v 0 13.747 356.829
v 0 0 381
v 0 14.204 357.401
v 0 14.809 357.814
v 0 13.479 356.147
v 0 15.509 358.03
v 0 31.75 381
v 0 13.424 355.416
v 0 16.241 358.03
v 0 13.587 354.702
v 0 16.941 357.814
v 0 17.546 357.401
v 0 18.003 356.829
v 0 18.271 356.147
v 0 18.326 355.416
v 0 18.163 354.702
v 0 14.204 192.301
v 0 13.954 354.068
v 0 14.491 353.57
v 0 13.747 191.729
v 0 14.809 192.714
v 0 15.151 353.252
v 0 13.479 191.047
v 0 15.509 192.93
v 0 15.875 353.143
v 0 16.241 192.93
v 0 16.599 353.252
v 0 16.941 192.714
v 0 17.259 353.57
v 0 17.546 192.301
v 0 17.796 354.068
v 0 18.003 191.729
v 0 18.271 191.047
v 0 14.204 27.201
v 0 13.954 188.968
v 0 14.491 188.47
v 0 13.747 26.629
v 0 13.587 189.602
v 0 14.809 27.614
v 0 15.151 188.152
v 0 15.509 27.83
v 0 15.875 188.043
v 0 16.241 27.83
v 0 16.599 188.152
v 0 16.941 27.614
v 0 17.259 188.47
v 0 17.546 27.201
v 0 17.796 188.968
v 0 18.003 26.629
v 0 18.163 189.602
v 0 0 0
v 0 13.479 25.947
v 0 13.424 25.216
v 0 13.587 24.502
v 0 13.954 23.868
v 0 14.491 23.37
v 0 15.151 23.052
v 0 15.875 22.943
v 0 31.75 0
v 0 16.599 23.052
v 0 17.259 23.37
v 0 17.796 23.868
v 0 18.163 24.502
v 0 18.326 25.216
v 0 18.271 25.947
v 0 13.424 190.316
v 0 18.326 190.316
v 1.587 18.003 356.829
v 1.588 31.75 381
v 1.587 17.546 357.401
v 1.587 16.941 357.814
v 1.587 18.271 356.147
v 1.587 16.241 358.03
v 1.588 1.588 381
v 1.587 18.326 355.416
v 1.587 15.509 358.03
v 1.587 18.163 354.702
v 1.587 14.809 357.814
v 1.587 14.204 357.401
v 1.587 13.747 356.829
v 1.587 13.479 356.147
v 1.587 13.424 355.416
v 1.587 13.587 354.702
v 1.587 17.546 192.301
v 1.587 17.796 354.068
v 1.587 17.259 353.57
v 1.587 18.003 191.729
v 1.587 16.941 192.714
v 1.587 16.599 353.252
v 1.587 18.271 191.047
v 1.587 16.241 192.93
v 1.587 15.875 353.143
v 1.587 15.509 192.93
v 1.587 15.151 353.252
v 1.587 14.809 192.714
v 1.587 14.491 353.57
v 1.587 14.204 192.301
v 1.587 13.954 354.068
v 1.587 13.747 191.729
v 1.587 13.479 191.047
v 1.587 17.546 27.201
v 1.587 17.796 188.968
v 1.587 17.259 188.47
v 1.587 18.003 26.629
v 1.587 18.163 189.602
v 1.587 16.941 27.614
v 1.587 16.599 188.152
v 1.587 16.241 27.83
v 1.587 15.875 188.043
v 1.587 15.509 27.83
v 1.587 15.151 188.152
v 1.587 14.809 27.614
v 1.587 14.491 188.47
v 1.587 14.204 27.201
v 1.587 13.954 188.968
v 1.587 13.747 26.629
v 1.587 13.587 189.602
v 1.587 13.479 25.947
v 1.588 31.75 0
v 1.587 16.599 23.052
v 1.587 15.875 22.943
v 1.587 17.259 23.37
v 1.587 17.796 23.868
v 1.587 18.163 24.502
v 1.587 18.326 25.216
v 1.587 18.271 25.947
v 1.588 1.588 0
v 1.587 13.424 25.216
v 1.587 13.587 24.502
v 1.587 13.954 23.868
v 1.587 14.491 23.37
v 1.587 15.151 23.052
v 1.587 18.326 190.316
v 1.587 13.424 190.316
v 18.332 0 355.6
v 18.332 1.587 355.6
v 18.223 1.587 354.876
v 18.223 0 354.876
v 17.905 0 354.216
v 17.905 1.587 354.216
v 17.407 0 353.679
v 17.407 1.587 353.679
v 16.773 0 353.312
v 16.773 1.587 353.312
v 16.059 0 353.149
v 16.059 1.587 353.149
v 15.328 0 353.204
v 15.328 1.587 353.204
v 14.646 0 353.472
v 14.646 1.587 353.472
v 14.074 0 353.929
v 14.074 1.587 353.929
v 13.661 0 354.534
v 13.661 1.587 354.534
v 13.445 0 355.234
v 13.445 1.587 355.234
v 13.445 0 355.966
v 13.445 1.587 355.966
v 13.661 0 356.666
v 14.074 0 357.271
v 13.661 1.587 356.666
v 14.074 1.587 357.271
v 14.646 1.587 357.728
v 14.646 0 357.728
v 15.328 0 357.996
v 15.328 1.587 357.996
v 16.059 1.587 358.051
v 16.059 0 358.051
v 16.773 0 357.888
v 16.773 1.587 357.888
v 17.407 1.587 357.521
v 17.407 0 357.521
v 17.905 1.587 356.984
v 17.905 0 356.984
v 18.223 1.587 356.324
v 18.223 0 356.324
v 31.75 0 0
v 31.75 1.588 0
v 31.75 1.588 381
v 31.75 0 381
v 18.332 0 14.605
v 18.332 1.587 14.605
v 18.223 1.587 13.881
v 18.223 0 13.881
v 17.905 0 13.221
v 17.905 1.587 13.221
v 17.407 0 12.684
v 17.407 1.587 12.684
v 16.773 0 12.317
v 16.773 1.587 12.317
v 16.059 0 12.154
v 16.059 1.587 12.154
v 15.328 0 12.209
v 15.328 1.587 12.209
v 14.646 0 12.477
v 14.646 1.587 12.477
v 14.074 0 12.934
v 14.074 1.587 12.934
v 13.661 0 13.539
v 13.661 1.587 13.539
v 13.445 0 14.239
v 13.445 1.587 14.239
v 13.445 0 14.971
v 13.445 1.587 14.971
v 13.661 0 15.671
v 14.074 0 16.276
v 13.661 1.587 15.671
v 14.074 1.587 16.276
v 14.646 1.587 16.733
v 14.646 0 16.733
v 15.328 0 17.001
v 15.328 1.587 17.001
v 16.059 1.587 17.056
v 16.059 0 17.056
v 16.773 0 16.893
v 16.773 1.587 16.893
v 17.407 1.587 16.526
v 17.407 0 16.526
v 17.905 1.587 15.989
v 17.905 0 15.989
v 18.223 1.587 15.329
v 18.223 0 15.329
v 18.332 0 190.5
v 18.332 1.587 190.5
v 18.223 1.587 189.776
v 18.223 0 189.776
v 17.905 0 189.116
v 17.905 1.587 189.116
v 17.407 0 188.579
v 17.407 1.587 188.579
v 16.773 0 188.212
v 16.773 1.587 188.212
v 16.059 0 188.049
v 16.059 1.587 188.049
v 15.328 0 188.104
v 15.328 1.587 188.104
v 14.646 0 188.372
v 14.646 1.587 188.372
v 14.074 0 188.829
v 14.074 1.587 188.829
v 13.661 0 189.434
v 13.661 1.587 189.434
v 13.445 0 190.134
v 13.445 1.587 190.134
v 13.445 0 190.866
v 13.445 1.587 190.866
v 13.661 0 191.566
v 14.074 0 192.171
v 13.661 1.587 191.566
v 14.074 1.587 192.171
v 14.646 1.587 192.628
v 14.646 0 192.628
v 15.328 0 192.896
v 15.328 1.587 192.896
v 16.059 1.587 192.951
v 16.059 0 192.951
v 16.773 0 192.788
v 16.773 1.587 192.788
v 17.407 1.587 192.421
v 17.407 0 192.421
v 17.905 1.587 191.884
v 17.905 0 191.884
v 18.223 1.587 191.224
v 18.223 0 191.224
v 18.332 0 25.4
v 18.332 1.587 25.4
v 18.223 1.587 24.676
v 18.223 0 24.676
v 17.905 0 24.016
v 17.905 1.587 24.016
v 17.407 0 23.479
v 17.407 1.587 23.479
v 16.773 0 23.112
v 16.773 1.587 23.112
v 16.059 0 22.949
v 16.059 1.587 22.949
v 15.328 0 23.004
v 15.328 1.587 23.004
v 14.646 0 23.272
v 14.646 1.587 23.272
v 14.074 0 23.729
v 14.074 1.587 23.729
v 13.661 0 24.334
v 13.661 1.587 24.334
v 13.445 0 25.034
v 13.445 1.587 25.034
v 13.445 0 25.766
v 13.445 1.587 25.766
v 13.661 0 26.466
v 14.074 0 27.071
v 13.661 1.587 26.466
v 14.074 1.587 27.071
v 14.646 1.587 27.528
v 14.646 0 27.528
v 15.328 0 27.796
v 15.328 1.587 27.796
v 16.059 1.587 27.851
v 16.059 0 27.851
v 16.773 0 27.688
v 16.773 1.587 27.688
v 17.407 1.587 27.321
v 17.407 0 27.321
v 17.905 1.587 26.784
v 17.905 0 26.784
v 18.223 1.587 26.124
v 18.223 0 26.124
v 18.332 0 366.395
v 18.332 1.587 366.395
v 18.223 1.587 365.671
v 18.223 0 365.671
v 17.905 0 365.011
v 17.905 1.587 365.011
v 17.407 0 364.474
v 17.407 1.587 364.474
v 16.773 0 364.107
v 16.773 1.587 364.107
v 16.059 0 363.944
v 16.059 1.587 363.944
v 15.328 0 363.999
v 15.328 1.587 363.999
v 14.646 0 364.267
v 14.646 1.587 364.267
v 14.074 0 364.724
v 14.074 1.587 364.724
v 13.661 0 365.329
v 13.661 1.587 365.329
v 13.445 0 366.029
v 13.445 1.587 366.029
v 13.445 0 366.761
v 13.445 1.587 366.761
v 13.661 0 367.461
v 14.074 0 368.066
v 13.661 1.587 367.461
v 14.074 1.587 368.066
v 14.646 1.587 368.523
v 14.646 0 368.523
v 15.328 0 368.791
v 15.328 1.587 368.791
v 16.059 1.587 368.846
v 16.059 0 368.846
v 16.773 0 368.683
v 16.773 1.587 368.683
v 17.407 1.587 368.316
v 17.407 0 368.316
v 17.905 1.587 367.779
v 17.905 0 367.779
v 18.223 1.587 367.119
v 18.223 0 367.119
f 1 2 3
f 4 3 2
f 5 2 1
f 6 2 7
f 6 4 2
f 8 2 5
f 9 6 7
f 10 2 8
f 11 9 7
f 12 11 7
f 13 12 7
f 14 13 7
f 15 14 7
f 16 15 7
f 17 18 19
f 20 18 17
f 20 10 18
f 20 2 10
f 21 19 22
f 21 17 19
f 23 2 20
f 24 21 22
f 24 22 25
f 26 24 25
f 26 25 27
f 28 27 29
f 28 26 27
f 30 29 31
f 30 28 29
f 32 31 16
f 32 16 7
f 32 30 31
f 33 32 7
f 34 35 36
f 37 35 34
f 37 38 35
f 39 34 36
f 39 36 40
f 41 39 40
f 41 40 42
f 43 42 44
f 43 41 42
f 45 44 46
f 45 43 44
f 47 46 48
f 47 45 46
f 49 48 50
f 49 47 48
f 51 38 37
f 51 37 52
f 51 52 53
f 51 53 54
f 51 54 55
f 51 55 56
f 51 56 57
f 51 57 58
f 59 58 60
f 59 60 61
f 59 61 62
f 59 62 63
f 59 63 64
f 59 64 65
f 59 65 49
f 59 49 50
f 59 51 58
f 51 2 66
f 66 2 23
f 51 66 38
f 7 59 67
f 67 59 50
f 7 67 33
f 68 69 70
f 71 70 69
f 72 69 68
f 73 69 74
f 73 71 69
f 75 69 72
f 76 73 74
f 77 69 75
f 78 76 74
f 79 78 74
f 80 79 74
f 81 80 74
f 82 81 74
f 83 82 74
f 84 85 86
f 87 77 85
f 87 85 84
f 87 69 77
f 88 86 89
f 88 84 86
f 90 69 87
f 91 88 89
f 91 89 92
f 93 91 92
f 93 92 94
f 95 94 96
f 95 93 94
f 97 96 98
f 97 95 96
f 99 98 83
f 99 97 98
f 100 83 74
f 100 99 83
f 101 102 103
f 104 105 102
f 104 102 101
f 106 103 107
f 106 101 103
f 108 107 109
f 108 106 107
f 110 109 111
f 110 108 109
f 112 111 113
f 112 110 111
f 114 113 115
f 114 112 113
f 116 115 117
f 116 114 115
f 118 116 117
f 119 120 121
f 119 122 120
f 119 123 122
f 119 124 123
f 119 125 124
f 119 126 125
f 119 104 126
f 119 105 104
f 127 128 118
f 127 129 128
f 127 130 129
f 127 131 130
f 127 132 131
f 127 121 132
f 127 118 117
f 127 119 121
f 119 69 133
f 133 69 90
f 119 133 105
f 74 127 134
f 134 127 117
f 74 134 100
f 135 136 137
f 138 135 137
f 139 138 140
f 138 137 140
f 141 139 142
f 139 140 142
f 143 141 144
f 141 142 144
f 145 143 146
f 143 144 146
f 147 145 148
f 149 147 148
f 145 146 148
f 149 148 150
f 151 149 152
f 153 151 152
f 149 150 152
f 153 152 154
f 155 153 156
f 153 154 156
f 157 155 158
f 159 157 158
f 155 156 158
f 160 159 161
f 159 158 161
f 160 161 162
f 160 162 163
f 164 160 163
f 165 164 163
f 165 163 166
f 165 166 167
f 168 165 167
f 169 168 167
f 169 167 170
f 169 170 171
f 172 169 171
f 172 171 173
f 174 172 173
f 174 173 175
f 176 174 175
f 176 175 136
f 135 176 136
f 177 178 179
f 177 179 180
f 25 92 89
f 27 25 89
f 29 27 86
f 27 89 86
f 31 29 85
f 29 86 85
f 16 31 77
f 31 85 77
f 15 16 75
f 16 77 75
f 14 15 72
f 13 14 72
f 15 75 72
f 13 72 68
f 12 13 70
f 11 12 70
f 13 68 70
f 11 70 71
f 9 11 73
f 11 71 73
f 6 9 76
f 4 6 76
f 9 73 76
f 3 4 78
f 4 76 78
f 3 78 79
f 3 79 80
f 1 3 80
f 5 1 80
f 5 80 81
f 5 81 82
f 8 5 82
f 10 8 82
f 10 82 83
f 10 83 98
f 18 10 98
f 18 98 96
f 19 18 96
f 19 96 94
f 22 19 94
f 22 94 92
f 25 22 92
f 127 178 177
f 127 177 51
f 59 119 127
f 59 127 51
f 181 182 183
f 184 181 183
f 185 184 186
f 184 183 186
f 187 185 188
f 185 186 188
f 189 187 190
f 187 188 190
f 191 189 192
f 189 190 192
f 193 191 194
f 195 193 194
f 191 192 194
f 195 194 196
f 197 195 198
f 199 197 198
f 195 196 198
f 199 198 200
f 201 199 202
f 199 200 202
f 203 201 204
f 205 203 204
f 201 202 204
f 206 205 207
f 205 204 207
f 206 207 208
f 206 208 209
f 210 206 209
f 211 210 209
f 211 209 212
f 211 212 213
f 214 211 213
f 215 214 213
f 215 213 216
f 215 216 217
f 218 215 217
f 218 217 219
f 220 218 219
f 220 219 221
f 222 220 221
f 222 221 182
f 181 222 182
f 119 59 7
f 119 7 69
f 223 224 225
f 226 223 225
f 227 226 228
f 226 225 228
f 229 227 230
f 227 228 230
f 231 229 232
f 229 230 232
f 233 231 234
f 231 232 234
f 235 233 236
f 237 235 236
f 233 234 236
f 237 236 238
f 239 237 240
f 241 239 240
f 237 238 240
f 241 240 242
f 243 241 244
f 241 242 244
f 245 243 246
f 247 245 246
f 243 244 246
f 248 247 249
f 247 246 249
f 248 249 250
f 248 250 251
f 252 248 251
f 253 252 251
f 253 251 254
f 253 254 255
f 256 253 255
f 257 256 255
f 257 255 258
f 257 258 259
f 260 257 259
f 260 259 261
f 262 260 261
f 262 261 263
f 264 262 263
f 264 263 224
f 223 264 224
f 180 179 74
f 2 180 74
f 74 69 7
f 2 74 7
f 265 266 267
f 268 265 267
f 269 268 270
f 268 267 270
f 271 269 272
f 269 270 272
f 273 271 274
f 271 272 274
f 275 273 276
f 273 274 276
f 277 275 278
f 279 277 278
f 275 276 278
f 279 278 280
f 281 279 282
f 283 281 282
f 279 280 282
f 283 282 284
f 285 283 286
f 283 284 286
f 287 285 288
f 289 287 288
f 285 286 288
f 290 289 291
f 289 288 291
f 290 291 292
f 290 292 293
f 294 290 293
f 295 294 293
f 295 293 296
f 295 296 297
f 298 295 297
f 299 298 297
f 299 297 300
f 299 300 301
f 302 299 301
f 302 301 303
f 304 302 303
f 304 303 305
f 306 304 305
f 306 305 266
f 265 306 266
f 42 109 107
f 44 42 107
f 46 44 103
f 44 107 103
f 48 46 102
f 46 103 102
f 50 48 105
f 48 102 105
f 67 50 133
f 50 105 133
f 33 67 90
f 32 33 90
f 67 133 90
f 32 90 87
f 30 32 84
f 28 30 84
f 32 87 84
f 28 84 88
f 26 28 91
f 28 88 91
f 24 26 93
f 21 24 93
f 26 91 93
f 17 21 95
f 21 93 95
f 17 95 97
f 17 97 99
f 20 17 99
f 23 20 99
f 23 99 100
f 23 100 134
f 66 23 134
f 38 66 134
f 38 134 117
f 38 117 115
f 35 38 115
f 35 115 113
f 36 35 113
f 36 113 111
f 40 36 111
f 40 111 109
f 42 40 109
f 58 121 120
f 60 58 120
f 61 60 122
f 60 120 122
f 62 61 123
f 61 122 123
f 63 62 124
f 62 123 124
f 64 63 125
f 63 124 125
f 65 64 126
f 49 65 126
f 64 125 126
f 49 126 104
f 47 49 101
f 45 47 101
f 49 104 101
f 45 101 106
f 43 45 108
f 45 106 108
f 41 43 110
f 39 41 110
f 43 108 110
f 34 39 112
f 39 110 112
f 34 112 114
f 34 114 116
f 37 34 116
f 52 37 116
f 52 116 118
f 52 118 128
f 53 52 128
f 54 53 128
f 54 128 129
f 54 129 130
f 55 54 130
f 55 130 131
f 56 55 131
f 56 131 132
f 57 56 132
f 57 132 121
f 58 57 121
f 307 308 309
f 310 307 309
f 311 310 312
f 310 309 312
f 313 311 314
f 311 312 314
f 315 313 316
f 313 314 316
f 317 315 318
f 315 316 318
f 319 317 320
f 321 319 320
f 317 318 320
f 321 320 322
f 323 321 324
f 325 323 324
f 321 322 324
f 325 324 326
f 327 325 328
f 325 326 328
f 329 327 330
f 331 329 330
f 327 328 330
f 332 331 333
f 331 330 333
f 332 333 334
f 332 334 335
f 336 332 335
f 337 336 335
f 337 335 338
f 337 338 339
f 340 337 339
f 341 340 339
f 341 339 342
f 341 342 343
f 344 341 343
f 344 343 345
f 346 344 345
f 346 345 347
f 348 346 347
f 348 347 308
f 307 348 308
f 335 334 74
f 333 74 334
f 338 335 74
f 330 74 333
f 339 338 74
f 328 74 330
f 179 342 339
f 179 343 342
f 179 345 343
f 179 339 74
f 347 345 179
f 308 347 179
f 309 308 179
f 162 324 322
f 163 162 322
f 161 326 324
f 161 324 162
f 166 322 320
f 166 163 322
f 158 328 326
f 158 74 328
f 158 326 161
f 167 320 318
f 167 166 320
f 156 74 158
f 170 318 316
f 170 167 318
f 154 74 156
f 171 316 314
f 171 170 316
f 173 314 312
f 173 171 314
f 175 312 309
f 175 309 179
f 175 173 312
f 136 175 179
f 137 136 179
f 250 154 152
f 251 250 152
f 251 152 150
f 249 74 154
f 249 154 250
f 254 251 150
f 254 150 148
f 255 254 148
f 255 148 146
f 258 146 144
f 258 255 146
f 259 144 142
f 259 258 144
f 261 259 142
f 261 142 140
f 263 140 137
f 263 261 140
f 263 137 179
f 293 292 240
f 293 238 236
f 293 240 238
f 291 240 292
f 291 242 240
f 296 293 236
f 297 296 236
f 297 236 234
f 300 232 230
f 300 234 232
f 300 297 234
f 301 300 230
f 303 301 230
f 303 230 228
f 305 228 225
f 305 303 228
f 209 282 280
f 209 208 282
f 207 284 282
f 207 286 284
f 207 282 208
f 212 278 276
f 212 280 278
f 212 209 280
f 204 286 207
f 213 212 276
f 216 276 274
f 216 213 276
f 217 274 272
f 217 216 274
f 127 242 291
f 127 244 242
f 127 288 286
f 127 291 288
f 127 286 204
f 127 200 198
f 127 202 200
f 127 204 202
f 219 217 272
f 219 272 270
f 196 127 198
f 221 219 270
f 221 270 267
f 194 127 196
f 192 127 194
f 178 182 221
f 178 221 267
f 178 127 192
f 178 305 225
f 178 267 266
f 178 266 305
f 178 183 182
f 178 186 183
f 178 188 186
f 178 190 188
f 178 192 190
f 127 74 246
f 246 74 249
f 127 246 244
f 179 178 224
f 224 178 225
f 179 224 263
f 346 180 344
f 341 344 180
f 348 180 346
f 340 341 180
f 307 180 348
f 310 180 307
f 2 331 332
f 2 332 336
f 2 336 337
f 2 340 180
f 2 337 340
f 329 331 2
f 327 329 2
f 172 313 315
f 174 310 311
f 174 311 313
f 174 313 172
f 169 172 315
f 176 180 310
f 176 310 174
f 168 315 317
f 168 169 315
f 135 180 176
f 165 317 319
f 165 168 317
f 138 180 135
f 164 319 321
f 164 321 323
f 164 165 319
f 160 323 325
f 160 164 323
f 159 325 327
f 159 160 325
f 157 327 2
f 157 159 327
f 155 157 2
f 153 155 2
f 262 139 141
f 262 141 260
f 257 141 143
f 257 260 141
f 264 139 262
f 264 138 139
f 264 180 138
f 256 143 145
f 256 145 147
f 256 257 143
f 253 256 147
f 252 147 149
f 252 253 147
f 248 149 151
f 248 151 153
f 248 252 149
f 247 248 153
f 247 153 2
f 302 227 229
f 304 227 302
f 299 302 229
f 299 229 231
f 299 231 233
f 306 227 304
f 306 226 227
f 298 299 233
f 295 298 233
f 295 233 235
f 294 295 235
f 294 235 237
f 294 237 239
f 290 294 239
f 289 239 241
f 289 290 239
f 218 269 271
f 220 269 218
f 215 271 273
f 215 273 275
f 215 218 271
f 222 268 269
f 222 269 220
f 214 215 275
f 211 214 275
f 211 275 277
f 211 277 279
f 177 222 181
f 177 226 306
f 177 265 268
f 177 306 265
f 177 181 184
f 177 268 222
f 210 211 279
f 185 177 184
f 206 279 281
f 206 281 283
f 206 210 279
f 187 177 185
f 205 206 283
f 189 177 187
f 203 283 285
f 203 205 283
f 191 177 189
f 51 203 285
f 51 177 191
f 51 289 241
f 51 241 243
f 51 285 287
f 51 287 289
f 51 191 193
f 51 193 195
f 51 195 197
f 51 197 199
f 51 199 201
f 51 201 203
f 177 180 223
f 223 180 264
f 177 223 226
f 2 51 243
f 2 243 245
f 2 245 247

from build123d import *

# Parameters (mm, degrees)
BOSS_EXTRUDE1_DEPTH          = 381
F_10_0_1935_DIAMETER_HOLE2_D = 4.9149
F_10_0_1935_DIAMETER_HOLE4_D = 4.9149


with BuildPart() as part:
    # Sketch2 → Boss-Extrude1 (new body)
    with BuildSketch(Plane.XY):
        Polygon((0, 0), (0, 31.75), (1.5875, 31.75), (1.5875, 1.5875), (31.75, 1.5875), (31.75, 0), align=None)
    extrude(amount=BOSS_EXTRUDE1_DEPTH)

    # #10 (0.1935) Diameter Hole2 (through all)
    with Locations(Plane.ZY):
        with Locations((355.6, 15.875), (25.4, 15.875), (190.5, 15.875)):
            Hole(F_10_0_1935_DIAMETER_HOLE2_D / 2)

    # #10 (0.1935) Diameter Hole4 (through all)
    with Locations(Plane(origin=(0, 0, 0), x_dir=(-1, 0, 0), z_dir=(0, -1, 0))):
        with Locations((-15.875, -366.395), (-15.875, -190.5), (-15.875, -25.4), (-15.875, -355.6), (-15.875, -14.605)):
            Hole(F_10_0_1935_DIAMETER_HOLE4_D / 2)


solid = part.part
